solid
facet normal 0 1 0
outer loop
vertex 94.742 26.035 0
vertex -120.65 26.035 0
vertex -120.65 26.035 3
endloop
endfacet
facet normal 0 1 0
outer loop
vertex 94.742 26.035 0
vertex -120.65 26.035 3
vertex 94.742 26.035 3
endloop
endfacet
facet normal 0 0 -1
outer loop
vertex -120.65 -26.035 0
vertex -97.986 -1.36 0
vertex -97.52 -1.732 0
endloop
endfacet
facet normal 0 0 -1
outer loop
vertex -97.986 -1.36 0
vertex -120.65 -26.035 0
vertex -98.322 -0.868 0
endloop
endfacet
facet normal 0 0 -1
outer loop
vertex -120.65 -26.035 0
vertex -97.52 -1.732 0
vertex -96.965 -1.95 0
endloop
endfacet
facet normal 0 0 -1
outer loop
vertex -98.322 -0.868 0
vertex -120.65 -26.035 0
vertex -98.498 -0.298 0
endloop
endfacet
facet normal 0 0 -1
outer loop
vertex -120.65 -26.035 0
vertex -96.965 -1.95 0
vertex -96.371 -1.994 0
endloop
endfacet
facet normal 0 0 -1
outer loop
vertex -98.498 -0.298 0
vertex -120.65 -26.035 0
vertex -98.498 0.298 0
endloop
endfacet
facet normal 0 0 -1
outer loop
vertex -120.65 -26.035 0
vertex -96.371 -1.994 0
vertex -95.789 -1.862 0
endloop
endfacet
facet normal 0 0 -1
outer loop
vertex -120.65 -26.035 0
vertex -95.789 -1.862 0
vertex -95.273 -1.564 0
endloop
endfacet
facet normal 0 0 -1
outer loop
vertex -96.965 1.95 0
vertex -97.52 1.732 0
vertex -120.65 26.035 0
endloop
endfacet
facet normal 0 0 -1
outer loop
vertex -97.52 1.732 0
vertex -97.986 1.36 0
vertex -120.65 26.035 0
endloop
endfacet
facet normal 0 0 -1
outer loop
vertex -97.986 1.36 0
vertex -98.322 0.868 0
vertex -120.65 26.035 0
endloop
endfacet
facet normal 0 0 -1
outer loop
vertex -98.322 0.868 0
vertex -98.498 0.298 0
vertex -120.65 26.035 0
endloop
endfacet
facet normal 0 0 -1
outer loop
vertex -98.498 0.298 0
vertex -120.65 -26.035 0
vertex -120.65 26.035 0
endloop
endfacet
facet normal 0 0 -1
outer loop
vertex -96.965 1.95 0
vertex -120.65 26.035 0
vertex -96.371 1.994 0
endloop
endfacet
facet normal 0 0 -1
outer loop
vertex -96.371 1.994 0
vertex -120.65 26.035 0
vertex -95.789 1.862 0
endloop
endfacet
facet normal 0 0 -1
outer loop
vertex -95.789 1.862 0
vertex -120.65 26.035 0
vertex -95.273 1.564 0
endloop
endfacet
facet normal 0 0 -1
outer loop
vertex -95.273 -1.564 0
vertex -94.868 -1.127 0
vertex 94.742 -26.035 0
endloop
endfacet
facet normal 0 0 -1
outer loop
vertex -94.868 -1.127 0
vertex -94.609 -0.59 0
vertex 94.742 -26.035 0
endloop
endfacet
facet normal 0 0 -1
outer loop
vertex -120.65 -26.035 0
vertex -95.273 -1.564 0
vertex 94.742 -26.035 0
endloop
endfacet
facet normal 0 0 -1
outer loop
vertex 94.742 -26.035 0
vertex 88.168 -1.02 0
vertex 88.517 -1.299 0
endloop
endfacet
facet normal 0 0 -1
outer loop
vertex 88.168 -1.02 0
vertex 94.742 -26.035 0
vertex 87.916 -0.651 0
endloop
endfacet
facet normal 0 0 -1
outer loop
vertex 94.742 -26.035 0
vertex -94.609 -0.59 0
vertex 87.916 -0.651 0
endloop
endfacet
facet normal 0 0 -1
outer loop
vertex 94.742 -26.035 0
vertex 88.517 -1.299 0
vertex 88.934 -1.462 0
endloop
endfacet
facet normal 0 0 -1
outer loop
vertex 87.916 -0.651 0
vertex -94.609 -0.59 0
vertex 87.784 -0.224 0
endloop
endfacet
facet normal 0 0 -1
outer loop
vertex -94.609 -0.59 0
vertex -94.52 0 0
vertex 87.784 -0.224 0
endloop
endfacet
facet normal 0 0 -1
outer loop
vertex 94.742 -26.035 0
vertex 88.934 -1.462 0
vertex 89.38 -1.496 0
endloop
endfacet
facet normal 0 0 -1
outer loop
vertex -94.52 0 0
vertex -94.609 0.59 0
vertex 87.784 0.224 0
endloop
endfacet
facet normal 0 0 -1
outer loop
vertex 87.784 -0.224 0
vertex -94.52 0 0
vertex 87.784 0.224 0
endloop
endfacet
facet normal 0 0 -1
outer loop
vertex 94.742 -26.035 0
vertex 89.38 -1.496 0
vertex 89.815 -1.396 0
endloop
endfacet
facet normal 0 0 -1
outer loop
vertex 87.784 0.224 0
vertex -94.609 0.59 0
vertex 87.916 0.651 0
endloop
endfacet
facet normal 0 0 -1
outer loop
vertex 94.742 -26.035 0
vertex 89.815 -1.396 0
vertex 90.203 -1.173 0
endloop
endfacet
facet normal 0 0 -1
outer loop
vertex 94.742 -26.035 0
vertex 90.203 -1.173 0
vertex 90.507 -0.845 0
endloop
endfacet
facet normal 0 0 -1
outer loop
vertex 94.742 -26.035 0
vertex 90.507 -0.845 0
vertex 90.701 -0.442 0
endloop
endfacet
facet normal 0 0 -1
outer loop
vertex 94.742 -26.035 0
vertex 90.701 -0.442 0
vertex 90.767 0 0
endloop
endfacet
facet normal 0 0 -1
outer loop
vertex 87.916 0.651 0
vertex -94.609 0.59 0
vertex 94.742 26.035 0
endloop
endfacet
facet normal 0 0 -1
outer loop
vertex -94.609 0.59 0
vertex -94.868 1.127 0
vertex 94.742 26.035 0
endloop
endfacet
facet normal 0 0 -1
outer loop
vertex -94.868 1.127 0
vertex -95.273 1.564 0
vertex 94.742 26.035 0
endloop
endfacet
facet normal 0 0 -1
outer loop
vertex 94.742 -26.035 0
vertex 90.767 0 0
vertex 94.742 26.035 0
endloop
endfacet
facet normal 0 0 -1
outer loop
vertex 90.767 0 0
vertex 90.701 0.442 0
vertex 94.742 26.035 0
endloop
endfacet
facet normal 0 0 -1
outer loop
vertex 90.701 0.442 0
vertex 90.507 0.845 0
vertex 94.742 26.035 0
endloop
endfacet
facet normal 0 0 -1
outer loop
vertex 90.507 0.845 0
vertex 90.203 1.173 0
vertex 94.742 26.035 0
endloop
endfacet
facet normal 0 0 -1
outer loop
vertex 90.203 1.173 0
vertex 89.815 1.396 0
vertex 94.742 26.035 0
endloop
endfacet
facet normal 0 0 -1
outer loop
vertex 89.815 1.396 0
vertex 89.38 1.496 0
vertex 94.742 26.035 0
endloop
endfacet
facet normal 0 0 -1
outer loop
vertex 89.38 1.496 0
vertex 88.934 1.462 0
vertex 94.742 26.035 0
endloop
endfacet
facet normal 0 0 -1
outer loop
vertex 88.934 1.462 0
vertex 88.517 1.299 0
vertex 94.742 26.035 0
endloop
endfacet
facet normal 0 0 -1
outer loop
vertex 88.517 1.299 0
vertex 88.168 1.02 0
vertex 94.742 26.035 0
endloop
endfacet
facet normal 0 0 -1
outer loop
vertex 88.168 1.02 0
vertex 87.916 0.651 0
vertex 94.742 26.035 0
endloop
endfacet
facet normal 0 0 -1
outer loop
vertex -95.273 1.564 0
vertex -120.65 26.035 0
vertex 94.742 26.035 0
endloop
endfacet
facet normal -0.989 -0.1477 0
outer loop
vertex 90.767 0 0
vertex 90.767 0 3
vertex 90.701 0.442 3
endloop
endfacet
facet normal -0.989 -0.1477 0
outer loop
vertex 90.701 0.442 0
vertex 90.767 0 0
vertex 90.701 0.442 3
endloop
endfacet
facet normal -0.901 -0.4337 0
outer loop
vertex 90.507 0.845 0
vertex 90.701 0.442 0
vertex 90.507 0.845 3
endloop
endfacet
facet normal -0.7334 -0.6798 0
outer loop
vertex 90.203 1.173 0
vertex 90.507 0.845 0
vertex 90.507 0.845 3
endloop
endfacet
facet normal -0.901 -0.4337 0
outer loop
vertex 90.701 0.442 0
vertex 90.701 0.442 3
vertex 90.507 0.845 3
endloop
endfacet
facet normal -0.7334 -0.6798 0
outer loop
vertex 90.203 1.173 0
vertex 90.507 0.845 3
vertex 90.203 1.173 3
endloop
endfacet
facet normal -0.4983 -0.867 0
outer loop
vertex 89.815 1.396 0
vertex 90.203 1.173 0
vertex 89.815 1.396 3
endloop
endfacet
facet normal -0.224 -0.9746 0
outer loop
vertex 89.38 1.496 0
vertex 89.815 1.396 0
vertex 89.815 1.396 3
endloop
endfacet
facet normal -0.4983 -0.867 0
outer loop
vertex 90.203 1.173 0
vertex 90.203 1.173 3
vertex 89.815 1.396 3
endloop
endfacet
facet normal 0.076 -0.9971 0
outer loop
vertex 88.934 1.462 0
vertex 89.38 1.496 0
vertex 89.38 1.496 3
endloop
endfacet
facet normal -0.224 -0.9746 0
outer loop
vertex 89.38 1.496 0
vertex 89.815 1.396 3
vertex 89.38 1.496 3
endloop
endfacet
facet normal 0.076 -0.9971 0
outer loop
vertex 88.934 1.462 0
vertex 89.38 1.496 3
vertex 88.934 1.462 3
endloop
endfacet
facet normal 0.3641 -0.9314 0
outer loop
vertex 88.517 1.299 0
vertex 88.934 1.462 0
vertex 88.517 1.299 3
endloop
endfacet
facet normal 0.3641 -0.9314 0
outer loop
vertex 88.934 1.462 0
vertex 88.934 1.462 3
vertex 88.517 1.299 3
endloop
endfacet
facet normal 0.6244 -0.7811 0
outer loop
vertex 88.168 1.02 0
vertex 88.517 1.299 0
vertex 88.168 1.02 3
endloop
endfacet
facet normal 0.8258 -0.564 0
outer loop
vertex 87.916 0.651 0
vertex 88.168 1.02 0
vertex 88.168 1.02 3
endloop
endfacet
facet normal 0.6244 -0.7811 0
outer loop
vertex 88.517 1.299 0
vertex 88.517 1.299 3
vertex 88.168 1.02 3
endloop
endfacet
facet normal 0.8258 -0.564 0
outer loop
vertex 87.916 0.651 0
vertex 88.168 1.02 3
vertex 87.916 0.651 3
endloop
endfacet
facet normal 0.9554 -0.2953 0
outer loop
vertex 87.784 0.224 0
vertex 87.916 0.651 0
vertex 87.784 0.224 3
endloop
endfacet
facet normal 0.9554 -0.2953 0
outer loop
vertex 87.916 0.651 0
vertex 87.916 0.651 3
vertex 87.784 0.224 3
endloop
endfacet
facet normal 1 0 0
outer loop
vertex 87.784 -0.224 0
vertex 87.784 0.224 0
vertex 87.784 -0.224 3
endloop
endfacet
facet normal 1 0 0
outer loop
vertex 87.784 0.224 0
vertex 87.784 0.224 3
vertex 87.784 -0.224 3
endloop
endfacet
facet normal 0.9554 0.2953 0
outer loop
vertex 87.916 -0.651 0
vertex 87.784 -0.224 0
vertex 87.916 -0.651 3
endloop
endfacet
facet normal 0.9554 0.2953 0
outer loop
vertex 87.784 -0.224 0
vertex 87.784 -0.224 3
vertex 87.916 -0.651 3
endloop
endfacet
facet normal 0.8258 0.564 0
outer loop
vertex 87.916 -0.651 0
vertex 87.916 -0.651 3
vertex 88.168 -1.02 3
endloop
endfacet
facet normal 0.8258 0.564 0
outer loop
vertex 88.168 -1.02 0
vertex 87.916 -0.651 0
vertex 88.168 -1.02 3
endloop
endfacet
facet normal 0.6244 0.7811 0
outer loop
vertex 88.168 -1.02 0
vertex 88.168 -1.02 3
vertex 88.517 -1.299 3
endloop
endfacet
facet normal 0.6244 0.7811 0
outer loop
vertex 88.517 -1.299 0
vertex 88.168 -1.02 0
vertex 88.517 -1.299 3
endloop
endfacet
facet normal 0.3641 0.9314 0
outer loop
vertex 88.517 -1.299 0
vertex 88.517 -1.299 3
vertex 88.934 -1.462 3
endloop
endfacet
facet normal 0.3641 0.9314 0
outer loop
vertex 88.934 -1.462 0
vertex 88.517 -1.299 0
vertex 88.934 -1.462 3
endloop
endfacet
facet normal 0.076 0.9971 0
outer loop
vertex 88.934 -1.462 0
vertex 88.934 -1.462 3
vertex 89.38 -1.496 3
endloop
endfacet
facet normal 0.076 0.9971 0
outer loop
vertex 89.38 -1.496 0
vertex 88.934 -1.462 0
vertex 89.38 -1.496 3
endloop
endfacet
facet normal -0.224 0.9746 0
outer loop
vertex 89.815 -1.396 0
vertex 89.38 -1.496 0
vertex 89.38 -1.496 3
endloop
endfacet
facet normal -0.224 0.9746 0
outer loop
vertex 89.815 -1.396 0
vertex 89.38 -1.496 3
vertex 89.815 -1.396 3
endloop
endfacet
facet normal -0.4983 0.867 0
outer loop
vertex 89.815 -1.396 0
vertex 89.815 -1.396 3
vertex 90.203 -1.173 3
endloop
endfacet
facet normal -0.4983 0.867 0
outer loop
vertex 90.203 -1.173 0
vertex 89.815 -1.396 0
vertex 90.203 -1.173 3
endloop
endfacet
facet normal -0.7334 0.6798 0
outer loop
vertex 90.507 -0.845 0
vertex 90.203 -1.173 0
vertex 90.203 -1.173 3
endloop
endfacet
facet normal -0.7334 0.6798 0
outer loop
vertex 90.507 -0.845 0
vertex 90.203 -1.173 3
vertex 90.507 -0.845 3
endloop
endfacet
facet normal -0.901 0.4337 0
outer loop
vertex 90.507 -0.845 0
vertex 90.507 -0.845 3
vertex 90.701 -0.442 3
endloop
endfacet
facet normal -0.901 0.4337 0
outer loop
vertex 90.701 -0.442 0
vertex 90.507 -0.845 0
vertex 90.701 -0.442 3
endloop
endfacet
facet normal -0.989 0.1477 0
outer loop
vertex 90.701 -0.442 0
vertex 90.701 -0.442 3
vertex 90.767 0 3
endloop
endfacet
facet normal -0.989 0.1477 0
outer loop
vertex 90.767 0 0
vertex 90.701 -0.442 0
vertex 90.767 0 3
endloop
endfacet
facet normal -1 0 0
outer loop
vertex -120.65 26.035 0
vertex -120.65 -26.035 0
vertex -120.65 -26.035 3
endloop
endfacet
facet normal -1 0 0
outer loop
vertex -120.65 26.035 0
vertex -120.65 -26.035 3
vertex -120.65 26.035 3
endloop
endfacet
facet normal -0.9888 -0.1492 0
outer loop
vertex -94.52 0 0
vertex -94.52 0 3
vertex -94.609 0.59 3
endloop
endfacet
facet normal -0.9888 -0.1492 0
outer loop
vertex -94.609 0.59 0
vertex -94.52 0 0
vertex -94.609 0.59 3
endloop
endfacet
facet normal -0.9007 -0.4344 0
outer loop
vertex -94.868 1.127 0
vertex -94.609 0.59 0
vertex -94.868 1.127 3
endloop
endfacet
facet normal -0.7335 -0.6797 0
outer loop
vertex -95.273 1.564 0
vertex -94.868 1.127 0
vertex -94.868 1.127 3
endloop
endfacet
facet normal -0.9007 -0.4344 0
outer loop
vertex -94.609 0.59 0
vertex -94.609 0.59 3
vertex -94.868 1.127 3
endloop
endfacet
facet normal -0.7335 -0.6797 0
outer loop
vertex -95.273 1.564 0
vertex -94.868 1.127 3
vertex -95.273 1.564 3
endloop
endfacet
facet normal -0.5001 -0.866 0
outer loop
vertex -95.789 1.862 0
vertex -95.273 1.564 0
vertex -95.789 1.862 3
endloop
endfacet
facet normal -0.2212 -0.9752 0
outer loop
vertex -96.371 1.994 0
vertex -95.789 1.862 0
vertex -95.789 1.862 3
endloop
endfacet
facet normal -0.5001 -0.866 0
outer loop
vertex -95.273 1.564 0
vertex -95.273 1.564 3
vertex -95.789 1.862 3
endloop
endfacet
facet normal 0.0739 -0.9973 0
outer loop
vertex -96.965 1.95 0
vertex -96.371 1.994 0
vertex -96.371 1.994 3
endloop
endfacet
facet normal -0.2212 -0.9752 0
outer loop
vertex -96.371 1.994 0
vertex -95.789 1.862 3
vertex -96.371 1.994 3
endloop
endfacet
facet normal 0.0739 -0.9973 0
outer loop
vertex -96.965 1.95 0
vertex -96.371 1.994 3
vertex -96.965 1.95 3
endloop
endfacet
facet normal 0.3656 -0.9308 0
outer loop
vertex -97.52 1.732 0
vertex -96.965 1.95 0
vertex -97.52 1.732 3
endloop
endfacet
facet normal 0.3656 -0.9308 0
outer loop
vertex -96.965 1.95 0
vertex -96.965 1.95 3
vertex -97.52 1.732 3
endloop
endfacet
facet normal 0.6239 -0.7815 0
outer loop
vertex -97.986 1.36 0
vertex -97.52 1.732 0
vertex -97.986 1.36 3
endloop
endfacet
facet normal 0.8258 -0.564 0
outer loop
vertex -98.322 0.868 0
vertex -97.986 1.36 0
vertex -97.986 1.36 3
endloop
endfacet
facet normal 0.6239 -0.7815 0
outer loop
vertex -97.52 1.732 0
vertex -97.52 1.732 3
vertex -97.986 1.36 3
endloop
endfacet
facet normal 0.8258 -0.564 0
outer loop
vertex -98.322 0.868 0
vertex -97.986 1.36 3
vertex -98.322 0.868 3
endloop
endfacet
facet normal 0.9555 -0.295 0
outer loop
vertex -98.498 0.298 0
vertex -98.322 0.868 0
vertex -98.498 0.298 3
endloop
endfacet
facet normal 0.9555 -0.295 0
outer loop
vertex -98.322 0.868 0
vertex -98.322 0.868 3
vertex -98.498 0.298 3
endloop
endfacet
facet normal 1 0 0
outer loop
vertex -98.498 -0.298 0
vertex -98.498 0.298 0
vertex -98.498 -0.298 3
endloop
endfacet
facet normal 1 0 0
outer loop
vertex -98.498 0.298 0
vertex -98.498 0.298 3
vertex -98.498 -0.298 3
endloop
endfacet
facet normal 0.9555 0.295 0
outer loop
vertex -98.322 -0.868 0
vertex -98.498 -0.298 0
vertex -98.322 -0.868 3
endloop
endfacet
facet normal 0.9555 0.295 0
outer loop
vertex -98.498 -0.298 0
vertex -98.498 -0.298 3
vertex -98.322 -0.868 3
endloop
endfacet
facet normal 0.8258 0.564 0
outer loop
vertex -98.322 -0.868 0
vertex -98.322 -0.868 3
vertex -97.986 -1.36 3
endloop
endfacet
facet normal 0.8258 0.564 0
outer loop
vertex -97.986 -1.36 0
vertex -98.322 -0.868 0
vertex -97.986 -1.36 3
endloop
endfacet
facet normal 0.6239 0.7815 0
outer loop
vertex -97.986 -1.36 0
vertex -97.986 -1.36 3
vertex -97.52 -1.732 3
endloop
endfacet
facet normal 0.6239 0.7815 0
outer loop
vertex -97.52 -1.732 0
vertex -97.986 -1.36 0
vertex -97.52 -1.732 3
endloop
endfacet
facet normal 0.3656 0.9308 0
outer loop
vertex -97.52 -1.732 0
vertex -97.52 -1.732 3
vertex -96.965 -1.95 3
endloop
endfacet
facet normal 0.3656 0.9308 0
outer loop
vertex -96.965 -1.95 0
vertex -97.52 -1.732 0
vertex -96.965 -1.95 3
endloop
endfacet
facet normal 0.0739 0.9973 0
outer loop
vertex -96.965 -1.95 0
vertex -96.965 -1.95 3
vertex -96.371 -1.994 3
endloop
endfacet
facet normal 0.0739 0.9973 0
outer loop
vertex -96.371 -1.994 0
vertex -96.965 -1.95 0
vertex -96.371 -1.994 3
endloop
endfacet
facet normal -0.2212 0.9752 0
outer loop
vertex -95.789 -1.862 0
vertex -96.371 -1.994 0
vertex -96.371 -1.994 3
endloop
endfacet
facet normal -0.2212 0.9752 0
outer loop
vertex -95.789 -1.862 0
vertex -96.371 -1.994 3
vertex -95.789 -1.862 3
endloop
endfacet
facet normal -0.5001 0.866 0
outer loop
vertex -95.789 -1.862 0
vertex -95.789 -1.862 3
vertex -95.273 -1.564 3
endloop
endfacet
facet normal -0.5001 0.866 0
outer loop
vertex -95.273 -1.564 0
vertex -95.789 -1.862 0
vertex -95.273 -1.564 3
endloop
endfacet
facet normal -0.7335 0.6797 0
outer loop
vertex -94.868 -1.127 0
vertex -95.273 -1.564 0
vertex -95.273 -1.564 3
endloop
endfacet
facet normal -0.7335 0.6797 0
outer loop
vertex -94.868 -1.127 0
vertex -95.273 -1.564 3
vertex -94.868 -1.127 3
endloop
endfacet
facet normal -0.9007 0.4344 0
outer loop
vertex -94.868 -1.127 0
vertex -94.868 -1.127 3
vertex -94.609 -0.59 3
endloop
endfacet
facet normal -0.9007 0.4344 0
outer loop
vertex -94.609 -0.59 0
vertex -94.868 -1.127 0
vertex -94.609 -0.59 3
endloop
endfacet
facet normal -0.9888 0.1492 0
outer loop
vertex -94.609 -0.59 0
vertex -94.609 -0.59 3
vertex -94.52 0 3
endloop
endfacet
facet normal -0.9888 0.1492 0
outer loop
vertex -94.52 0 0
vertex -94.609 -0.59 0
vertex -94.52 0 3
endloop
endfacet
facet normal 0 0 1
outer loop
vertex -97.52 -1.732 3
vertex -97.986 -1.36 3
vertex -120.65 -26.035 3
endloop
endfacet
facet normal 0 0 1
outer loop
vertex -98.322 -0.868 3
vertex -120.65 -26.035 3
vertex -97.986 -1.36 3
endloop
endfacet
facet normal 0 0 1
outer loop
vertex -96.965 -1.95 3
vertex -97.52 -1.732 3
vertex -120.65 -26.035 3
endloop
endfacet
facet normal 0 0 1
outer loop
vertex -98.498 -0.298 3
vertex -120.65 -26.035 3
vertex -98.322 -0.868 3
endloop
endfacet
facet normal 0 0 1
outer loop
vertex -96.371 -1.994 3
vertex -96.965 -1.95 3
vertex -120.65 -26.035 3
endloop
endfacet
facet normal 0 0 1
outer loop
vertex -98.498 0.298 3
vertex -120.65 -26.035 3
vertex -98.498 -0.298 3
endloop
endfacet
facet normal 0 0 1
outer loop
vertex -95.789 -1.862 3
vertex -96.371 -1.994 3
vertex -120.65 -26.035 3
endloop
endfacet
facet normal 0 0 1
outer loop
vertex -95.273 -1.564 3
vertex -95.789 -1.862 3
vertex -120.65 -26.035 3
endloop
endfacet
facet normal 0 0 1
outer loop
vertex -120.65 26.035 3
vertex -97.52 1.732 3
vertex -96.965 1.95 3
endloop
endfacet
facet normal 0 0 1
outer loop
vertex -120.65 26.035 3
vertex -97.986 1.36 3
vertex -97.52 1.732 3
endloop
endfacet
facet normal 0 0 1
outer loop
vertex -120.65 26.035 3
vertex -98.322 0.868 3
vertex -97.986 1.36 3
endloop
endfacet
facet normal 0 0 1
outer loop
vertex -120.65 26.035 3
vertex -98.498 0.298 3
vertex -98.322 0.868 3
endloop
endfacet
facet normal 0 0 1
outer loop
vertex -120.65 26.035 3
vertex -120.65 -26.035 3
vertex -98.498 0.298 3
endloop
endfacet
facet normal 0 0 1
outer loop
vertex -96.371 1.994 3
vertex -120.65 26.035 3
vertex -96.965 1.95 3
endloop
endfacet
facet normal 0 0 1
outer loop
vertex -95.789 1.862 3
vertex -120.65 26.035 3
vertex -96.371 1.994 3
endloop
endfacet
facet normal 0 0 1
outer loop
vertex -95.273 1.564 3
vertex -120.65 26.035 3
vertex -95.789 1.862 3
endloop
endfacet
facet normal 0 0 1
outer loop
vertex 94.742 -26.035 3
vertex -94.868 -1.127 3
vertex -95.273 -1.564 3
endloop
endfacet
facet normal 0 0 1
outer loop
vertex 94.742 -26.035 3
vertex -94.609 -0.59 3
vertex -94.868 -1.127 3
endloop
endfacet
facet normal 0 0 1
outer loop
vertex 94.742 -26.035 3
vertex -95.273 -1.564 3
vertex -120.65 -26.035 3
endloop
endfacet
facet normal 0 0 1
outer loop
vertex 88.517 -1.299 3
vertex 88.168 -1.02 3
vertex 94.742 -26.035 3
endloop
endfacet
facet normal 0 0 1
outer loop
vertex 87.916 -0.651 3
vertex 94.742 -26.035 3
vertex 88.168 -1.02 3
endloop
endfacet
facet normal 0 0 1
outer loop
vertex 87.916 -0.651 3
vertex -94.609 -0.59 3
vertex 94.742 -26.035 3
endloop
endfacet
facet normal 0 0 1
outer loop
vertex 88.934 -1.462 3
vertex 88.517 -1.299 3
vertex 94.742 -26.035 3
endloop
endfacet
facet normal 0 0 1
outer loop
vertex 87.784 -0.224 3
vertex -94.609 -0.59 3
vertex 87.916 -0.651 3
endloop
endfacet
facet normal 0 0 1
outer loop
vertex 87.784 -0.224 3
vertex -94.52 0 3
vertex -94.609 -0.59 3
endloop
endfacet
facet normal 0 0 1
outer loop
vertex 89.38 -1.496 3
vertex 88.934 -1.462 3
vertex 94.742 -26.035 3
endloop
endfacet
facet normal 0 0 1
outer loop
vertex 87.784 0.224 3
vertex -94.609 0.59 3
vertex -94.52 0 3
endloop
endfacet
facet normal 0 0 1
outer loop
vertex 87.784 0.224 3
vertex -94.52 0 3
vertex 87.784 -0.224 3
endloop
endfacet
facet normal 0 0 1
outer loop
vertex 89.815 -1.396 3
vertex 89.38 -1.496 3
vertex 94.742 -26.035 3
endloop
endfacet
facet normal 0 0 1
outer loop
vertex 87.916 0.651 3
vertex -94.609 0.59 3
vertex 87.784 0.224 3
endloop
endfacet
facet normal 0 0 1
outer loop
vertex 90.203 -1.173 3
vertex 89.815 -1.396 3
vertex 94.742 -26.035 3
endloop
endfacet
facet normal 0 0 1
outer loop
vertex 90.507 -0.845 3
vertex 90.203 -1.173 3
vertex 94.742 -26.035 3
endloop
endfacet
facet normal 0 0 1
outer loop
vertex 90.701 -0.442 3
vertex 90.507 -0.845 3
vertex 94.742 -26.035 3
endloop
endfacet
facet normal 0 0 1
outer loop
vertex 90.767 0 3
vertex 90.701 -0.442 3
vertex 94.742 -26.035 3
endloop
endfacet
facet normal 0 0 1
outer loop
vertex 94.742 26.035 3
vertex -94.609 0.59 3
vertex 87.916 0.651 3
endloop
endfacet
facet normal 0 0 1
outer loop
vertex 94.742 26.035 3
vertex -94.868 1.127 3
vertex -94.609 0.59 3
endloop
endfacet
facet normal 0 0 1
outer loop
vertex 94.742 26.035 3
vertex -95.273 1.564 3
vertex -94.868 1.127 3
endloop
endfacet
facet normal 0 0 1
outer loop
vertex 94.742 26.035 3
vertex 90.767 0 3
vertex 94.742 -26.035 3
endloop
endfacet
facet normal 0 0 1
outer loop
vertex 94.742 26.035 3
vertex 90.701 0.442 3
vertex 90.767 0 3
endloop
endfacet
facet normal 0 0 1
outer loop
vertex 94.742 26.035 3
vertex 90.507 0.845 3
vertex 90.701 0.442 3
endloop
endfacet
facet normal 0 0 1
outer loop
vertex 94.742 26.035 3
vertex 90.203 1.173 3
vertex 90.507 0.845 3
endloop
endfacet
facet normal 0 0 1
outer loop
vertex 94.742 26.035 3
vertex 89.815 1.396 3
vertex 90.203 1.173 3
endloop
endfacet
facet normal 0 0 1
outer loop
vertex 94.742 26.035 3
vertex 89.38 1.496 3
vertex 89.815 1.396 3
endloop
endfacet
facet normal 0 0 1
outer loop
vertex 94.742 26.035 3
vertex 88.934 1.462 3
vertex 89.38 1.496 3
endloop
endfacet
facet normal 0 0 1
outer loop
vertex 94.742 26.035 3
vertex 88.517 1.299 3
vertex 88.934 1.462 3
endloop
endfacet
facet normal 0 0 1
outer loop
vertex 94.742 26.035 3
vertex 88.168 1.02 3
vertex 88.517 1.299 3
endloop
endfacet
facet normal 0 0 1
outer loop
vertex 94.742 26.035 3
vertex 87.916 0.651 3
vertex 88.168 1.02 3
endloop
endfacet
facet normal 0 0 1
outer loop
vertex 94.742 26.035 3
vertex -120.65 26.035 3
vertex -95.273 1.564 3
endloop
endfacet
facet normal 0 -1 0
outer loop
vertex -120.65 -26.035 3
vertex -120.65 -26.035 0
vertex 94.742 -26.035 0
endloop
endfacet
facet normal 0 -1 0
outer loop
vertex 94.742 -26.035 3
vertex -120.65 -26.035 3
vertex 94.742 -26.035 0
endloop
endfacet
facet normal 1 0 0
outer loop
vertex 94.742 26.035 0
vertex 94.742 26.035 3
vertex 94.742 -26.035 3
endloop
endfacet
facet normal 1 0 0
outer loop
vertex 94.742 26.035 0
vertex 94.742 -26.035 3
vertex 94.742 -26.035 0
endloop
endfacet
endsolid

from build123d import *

# Parameters (mm, degrees)
SKETCH1_W           = 241.3
SKETCH1_H           = 52.07
BOSS_EXTRUDE1_DEPTH = 3
SKETCH2_R           = 2
CUT_EXTRUDE1_DEPTH  = 124.463531964
SKETCH7_R           = 1.5
CUT_EXTRUDE3_DEPTH  = 124.463531964
SKETCH8_W           = 3
SKETCH8_H           = 52.07
CUT_EXTRUDE4_DEPTH  = 25.908


with BuildPart() as part:
    # Sketch1 → Boss-Extrude1 (new body)
    with BuildSketch(Plane.XY):
        Rectangle(SKETCH1_W, SKETCH1_H)
    extrude(amount=BOSS_EXTRUDE1_DEPTH)

    # Sketch2 → Cut-Extrude1 (cut, through all)
    with BuildSketch(Plane.XY.offset(3)):
        with Locations((113.339406907, 0)):
            Circle(SKETCH2_R)
        with Locations((-96.52, 0)):
            Circle(SKETCH2_R)
    extrude(amount=-CUT_EXTRUDE1_DEPTH, mode=Mode.SUBTRACT)

    # Sketch7 → Cut-Extrude3 (cut, through all)
    with BuildSketch(Plane.XY.offset(3)):
        with Locations((89.267430612, 0)):
            Circle(SKETCH7_R)
    extrude(amount=-CUT_EXTRUDE3_DEPTH, mode=Mode.SUBTRACT)

    # Sketch8 → Cut-Extrude4 (cut)
    with BuildSketch(Plane(origin=(120.65, 0, 0), x_dir=(0, 0, -1), z_dir=(1, 0, 0))):
        with Locations((-1.5, 0)):
            Rectangle(SKETCH8_W, SKETCH8_H)
    extrude(amount=-CUT_EXTRUDE4_DEPTH, mode=Mode.SUBTRACT)


solid = part.part
